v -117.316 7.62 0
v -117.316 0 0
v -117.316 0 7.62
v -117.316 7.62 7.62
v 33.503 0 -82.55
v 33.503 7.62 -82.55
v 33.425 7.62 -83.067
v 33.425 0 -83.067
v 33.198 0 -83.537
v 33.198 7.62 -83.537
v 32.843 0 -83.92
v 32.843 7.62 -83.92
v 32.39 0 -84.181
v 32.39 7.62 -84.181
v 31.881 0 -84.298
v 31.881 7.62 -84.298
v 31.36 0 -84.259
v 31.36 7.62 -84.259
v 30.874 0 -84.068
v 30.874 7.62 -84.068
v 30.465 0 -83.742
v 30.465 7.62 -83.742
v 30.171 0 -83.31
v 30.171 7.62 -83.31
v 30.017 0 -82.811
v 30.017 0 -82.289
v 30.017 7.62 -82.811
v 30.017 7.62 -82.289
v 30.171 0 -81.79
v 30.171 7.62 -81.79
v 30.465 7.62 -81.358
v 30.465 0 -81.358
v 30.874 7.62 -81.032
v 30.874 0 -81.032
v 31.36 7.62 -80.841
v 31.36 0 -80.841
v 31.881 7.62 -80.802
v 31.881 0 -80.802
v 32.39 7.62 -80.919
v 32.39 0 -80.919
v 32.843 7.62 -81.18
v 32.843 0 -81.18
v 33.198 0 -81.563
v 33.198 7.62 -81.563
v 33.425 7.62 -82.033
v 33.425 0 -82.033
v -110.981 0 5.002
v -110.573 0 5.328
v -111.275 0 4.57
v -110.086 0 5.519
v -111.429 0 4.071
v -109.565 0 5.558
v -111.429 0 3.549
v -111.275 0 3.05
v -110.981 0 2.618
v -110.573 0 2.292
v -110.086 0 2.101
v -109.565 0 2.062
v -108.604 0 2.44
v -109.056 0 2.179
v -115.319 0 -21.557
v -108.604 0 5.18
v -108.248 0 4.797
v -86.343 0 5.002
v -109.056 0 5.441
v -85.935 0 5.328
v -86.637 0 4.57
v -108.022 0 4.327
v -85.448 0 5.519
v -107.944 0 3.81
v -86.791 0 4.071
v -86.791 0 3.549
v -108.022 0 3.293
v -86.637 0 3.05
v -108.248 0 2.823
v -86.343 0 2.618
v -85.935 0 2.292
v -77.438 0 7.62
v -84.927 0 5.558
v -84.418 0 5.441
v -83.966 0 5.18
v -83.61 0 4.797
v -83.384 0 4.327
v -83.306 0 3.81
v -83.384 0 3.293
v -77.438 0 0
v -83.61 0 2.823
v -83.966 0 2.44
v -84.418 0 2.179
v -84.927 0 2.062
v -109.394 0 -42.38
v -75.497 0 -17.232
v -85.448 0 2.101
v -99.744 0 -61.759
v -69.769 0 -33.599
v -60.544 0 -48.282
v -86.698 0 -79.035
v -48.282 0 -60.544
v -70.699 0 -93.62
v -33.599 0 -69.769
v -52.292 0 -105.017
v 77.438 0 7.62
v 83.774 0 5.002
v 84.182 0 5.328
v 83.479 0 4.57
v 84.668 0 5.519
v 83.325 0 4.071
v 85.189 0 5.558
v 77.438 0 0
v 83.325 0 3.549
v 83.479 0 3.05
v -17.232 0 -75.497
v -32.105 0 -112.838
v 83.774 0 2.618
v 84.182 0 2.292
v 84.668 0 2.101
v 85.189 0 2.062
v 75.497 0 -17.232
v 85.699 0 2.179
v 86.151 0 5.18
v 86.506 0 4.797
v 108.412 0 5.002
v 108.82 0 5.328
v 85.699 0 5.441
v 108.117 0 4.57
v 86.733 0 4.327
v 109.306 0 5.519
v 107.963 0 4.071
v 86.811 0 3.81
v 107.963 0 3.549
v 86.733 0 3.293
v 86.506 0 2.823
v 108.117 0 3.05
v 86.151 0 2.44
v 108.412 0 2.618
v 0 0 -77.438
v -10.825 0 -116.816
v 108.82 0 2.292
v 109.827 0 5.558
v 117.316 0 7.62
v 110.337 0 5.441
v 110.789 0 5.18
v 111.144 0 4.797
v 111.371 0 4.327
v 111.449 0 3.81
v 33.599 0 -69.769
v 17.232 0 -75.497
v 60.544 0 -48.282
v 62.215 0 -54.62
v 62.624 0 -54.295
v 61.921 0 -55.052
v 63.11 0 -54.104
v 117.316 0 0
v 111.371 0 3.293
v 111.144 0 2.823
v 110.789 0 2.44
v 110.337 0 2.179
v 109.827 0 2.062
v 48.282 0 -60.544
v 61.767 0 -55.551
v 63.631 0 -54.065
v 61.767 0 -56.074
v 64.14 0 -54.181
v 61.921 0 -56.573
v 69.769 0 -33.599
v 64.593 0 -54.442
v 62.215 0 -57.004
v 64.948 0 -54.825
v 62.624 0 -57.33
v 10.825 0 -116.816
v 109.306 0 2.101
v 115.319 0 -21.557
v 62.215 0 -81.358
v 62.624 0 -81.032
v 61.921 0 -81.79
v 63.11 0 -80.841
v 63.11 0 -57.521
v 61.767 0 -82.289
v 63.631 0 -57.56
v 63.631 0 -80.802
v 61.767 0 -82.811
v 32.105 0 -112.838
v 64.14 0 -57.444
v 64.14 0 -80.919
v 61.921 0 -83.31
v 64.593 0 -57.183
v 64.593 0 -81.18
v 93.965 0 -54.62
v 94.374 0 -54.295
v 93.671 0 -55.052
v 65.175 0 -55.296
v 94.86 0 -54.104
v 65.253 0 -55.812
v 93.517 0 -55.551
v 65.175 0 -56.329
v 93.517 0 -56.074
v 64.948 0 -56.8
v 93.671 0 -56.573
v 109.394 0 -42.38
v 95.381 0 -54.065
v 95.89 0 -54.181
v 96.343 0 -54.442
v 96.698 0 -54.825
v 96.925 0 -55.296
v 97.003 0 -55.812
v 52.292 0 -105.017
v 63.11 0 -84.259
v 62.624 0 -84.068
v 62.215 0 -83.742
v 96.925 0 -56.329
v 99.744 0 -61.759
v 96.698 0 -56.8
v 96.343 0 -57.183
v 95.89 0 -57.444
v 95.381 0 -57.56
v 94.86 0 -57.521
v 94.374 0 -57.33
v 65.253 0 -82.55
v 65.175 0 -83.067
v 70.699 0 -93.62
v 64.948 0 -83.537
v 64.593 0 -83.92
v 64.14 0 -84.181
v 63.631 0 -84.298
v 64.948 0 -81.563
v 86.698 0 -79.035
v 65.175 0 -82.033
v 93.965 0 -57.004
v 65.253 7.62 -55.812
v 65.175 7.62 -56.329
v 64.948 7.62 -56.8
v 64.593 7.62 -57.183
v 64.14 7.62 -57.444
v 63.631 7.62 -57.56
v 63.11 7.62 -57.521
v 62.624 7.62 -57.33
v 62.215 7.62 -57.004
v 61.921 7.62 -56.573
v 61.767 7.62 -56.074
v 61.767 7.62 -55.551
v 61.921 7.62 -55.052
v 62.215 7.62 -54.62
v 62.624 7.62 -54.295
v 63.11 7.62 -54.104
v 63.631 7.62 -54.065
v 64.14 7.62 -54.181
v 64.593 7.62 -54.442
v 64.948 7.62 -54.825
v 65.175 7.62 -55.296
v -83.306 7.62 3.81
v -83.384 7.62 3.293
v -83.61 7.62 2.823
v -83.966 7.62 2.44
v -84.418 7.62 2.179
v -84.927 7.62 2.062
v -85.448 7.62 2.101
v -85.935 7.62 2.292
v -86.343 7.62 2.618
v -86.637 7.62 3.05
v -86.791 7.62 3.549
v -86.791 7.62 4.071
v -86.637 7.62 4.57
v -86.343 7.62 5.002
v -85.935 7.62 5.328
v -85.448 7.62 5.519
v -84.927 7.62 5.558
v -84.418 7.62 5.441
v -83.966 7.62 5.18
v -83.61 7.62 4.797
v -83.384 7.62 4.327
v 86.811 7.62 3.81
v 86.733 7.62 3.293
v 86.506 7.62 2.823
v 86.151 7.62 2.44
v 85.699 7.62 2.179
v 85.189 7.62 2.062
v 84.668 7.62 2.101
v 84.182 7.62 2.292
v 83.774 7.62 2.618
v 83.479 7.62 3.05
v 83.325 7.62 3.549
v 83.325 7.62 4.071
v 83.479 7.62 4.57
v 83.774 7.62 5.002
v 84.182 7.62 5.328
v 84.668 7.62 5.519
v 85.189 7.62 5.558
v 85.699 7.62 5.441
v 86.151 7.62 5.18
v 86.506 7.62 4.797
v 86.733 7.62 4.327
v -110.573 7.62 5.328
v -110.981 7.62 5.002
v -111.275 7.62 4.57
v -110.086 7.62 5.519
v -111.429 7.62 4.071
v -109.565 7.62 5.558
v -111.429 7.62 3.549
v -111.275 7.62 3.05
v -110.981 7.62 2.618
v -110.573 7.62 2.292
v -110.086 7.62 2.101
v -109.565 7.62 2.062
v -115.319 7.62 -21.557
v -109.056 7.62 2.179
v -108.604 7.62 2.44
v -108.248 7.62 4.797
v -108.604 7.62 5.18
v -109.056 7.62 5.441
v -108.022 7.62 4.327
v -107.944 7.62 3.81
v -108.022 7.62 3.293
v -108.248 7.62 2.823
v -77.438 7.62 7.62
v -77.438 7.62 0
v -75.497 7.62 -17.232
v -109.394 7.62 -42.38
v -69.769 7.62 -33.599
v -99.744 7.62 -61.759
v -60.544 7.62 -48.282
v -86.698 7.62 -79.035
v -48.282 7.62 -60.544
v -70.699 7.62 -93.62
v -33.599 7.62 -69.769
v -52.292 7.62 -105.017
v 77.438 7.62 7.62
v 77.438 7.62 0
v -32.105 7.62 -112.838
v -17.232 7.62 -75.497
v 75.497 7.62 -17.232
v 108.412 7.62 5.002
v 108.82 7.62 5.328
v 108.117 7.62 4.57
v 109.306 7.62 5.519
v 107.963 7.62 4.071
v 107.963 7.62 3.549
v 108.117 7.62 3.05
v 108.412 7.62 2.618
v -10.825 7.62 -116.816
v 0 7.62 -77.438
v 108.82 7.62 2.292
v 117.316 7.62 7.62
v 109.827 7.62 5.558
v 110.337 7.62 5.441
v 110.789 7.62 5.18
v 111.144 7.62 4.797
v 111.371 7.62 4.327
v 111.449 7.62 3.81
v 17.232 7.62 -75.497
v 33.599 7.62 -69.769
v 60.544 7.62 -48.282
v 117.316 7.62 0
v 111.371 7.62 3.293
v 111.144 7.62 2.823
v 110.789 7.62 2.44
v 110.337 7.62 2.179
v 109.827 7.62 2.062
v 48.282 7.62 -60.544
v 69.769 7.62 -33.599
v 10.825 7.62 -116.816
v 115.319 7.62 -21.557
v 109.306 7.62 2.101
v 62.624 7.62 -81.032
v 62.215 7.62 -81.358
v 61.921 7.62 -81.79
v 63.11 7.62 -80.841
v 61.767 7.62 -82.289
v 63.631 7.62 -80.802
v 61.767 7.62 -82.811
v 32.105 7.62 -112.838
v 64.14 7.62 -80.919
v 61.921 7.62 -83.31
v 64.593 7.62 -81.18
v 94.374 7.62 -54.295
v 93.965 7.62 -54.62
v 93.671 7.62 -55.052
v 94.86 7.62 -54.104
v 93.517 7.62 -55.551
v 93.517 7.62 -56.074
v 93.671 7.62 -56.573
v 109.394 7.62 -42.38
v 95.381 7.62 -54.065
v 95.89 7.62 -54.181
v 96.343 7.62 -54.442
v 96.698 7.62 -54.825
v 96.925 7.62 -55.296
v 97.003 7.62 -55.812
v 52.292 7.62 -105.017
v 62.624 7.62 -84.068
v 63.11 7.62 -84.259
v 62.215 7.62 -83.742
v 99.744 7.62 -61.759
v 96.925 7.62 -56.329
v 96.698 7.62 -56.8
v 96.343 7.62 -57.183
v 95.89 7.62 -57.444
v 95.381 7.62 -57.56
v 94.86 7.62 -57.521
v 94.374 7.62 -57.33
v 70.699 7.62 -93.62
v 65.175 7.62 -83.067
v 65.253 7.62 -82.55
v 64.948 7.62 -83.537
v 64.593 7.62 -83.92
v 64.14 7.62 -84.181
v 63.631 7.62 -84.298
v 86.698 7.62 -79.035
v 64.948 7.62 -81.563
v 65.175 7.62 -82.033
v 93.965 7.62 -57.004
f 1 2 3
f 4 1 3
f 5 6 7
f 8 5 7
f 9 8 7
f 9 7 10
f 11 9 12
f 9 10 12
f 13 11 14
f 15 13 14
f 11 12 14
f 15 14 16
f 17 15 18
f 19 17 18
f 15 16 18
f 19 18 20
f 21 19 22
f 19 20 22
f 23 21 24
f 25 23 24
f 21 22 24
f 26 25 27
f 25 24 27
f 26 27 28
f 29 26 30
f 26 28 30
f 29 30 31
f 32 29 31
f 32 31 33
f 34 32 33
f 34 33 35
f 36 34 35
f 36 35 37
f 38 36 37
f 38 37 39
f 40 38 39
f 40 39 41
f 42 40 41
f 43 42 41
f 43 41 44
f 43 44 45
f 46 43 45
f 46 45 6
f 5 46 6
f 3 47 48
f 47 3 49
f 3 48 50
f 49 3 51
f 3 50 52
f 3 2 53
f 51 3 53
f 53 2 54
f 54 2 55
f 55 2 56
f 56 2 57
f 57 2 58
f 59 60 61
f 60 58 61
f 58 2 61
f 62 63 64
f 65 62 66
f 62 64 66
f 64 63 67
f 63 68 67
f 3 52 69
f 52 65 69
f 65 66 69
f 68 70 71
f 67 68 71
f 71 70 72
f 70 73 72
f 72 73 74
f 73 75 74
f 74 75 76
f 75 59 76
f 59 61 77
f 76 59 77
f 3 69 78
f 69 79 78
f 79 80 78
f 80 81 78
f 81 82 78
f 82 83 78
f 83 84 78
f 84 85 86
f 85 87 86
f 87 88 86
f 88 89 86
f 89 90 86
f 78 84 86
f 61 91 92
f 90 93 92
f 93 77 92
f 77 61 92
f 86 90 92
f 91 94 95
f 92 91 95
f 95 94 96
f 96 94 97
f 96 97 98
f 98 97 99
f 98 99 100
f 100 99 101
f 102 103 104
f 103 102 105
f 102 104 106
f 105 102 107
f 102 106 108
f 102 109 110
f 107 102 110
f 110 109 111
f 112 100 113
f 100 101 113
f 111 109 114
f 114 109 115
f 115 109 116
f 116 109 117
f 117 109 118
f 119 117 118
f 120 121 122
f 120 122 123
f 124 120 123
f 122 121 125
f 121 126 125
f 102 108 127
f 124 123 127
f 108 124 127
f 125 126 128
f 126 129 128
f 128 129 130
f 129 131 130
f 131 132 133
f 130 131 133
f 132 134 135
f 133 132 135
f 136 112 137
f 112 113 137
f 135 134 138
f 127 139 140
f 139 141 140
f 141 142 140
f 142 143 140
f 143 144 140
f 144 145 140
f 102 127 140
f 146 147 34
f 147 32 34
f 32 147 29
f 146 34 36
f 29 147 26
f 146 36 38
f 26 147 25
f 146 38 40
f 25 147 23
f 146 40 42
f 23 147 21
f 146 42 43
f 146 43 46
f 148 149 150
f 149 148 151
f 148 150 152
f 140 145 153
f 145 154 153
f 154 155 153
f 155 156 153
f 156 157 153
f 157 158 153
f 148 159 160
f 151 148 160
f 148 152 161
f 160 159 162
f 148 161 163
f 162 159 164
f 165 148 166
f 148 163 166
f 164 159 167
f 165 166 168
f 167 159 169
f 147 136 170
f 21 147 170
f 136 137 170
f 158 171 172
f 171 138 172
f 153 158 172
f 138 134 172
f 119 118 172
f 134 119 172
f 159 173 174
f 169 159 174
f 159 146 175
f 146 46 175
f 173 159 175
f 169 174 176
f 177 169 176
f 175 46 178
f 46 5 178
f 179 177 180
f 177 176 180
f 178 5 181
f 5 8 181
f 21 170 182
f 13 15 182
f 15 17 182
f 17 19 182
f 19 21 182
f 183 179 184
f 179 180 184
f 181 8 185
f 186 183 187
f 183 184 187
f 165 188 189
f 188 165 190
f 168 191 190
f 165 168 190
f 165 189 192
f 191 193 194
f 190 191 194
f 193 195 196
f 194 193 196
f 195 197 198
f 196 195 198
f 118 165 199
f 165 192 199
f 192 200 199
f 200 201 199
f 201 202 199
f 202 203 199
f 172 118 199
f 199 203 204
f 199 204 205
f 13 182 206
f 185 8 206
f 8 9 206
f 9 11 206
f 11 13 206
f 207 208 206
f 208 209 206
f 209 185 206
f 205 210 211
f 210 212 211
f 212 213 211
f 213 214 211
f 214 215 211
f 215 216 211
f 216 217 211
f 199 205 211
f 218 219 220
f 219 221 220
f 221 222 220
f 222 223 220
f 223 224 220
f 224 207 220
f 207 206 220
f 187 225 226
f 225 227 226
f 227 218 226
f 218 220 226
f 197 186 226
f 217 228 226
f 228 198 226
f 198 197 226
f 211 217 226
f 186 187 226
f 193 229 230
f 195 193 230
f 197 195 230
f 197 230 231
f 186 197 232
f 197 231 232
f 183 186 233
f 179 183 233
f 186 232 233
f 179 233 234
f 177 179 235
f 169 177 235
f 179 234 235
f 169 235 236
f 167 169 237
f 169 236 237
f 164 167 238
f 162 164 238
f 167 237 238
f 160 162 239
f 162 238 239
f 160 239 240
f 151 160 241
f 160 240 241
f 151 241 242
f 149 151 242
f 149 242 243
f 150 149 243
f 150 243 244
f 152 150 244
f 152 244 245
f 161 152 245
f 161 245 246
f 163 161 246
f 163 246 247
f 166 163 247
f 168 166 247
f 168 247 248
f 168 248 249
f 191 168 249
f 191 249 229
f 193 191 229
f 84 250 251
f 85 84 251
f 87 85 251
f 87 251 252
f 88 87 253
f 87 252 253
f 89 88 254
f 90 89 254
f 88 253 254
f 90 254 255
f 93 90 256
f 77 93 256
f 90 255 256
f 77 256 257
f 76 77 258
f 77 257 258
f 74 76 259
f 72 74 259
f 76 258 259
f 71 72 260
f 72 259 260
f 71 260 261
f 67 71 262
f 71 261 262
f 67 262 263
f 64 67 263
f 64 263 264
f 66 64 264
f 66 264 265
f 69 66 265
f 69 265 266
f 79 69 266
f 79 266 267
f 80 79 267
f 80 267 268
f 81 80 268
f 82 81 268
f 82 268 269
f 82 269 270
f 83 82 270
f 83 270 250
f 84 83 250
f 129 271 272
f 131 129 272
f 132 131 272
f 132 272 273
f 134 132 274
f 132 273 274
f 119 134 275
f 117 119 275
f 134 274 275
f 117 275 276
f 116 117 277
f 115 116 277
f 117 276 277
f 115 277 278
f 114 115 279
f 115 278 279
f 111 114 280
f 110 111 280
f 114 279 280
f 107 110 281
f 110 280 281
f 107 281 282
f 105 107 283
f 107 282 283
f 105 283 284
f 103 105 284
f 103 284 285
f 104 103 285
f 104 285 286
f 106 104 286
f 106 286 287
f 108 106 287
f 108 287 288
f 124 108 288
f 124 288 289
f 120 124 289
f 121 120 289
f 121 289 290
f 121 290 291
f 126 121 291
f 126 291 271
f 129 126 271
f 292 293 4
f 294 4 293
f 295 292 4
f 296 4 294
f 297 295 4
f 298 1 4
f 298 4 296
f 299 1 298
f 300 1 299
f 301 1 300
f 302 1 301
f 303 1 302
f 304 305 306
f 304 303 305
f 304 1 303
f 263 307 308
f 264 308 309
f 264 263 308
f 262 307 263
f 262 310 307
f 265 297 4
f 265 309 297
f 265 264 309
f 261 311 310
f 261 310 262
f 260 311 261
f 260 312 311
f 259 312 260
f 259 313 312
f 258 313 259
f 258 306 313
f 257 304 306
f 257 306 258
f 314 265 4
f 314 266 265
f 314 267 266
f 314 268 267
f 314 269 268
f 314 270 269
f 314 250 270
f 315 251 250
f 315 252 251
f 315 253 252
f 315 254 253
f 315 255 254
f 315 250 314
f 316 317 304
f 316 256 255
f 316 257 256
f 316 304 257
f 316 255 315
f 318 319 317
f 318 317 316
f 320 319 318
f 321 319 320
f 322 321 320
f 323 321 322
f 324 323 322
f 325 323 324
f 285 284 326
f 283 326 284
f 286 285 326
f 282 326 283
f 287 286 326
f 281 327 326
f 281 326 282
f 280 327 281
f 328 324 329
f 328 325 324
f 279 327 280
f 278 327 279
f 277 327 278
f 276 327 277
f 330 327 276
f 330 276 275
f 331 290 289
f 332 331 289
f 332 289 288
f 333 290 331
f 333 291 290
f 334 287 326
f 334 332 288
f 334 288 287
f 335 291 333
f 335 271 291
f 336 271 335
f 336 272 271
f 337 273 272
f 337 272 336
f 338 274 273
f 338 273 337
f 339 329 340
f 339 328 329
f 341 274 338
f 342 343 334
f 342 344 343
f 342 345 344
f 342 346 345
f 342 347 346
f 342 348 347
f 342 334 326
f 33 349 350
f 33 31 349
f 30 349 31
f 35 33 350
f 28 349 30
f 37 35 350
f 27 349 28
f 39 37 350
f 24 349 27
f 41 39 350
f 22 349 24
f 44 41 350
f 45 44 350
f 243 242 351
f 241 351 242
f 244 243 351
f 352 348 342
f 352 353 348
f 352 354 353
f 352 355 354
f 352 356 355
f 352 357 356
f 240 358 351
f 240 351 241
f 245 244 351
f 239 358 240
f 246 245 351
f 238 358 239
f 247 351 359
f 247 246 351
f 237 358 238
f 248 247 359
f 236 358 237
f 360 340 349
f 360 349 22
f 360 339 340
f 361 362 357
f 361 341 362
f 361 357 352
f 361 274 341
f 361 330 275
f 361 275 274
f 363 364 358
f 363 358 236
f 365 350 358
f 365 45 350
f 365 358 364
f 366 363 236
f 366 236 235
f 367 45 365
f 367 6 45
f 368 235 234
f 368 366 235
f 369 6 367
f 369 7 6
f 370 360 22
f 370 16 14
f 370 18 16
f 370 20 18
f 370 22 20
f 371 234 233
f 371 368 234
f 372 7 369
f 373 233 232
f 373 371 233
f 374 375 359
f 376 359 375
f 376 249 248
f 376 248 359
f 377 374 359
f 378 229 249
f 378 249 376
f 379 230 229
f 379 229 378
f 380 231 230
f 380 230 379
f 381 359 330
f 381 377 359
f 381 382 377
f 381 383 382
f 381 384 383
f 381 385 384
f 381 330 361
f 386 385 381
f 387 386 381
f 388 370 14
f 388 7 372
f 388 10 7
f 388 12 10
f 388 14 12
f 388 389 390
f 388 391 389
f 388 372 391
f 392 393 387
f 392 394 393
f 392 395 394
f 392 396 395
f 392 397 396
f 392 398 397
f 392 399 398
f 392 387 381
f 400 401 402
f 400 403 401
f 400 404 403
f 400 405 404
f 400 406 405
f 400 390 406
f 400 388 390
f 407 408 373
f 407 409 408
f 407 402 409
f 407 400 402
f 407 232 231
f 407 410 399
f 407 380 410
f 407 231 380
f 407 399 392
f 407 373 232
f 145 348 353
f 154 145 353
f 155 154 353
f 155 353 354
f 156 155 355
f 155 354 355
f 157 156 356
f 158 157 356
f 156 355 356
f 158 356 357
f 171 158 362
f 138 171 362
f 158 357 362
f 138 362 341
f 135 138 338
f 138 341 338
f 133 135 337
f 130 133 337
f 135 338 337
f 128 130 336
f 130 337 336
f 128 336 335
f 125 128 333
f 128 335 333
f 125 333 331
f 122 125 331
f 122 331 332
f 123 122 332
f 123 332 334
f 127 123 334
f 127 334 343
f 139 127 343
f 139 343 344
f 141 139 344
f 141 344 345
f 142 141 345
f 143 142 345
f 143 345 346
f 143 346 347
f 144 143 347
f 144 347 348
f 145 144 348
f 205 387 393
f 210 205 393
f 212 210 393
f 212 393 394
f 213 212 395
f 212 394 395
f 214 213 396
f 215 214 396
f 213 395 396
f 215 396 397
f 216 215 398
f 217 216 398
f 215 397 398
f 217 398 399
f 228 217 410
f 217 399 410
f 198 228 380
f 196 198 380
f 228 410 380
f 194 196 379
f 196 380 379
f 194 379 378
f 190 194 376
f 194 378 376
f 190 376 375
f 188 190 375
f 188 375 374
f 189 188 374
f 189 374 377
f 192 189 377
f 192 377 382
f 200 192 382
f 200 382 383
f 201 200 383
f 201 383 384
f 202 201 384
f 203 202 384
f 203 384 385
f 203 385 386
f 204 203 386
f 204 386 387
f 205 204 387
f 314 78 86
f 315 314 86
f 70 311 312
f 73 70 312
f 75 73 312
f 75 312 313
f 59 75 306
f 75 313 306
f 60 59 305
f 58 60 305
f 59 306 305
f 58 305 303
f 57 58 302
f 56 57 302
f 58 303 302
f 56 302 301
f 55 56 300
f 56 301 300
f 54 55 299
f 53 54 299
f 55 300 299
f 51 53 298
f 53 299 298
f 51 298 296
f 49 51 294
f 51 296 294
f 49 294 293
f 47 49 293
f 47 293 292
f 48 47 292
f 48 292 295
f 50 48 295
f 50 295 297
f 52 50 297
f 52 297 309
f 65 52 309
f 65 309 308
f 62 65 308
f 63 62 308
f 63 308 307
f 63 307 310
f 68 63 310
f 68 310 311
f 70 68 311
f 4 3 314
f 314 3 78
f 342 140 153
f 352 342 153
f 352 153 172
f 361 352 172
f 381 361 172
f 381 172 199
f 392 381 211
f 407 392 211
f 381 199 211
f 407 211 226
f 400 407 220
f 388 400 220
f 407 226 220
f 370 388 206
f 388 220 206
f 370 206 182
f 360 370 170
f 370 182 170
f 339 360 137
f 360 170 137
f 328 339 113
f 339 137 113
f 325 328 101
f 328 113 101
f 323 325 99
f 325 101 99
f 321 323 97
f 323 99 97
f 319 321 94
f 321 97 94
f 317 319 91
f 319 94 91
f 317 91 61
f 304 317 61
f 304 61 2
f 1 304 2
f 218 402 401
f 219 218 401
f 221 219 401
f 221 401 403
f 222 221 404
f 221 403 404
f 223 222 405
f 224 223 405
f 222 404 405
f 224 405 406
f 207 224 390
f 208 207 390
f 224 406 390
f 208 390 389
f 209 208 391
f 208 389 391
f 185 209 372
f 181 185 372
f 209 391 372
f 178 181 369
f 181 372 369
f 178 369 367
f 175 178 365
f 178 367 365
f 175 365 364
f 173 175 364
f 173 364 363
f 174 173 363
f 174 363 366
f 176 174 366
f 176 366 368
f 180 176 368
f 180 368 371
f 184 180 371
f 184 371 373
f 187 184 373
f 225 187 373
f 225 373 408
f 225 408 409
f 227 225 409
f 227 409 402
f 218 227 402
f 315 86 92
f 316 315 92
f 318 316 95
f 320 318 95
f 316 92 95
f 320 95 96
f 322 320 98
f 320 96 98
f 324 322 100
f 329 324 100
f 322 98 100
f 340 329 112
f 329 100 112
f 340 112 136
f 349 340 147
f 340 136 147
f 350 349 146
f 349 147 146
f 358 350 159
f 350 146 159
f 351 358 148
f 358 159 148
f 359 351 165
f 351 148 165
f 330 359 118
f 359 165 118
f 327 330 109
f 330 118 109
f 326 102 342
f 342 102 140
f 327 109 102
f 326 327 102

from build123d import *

# Parameters (mm, degrees)
BOSS_EXTRUDE1_DEPTH = 7.62
CUT_EXTRUDE1_REACH  = 9.62
SKETCH3_R           = 1.7526


with BuildPart() as part:
    # Sketch1 → Boss-Extrude1 (new body)
    with BuildSketch(Plane(origin=(0, 0, 0), x_dir=(1, 0, 0), z_dir=(0, 1, 0))):
        with BuildLine():
            Line((-117.31625, 0), (-117.31625, -7.62))
            Line((-117.31625, -7.62), (-77.43825, -7.62))
            Line((-77.43825, -7.62), (-77.43825, 0))
            ThreePointArc((-77.43825, 0), (0, 77.43825), (77.43825, 0))
            Line((77.43825, 0), (77.43825, -7.62))
            Line((77.43825, -7.62), (117.31625, -7.62))
            Line((117.31625, -7.62), (117.31625, 0))
            ThreePointArc((117.31625, 0), (0, 117.31625), (-117.31625, 0))
        make_face()
    extrude(amount=BOSS_EXTRUDE1_DEPTH)

    # Sketch3 → Cut-Extrude1 (cut, up to next)
    with BuildSketch(Plane(origin=(0, 7.62, 0), x_dir=(1, 0, 0), z_dir=(0, 1, 0)), mode=Mode.PRIVATE) as cut_extrude1_sk1:
        with Locations((-109.69625, -3.81)):
            Circle(SKETCH3_R)
    cut_extrude1_tool1 = extrude(cut_extrude1_sk1.sketch, amount=-CUT_EXTRUDE1_REACH, mode=Mode.PRIVATE) & part.part
    add(cut_extrude1_tool1.solids().sort_by_distance((-109.69625, 7.62, 3.81))[0], mode=Mode.SUBTRACT)
    # Sketch3 → Cut-Extrude1 (cut, up to next)
    with BuildSketch(Plane(origin=(0, 7.62, 0), x_dir=(1, 0, 0), z_dir=(0, 1, 0)), mode=Mode.PRIVATE) as cut_extrude1_sk2:
        with Locations((-85.05825, -3.81)):
            Circle(SKETCH3_R)
    cut_extrude1_tool2 = extrude(cut_extrude1_sk2.sketch, amount=-CUT_EXTRUDE1_REACH, mode=Mode.PRIVATE) & part.part
    add(cut_extrude1_tool2.solids().sort_by_distance((-85.05825, 7.62, 3.81))[0], mode=Mode.SUBTRACT)
    # Sketch3 → Cut-Extrude1 (cut, up to next)
    with BuildSketch(Plane(origin=(0, 7.62, 0), x_dir=(1, 0, 0), z_dir=(0, 1, 0)), mode=Mode.PRIVATE) as cut_extrude1_sk3:
        with Locations((85.05825, -3.81)):
            Circle(SKETCH3_R)
    cut_extrude1_tool3 = extrude(cut_extrude1_sk3.sketch, amount=-CUT_EXTRUDE1_REACH, mode=Mode.PRIVATE) & part.part
    add(cut_extrude1_tool3.solids().sort_by_distance((85.05825, 7.62, 3.81))[0], mode=Mode.SUBTRACT)
    # Sketch3 → Cut-Extrude1 (cut, up to next)
    with BuildSketch(Plane(origin=(0, 7.62, 0), x_dir=(1, 0, 0), z_dir=(0, 1, 0)), mode=Mode.PRIVATE) as cut_extrude1_sk4:
        with Locations((109.69625, -3.81)):
            Circle(SKETCH3_R)
    cut_extrude1_tool4 = extrude(cut_extrude1_sk4.sketch, amount=-CUT_EXTRUDE1_REACH, mode=Mode.PRIVATE) & part.part
    add(cut_extrude1_tool4.solids().sort_by_distance((109.69625, 7.62, 3.81))[0], mode=Mode.SUBTRACT)
    # Sketch3 → Cut-Extrude1 (cut, up to next)
    with BuildSketch(Plane(origin=(0, 7.62, 0), x_dir=(1, 0, 0), z_dir=(0, 1, 0)), mode=Mode.PRIVATE) as cut_extrude1_sk5:
        with Locations((31.75, 82.55)):
            Circle(SKETCH3_R)
    cut_extrude1_tool5 = extrude(cut_extrude1_sk5.sketch, amount=-CUT_EXTRUDE1_REACH, mode=Mode.PRIVATE) & part.part
    add(cut_extrude1_tool5.solids().sort_by_distance((31.75, 7.62, -82.55))[0], mode=Mode.SUBTRACT)
    # Sketch3 → Cut-Extrude1 (cut, up to next)
    with BuildSketch(Plane(origin=(0, 7.62, 0), x_dir=(1, 0, 0), z_dir=(0, 1, 0)), mode=Mode.PRIVATE) as cut_extrude1_sk6:
        with Locations((63.5, 82.55)):
            Circle(SKETCH3_R)
    cut_extrude1_tool6 = extrude(cut_extrude1_sk6.sketch, amount=-CUT_EXTRUDE1_REACH, mode=Mode.PRIVATE) & part.part
    add(cut_extrude1_tool6.solids().sort_by_distance((63.5, 7.62, -82.55))[0], mode=Mode.SUBTRACT)
    # Sketch3 → Cut-Extrude1 (cut, up to next)
    with BuildSketch(Plane(origin=(0, 7.62, 0), x_dir=(1, 0, 0), z_dir=(0, 1, 0)), mode=Mode.PRIVATE) as cut_extrude1_sk7:
        with Locations((63.5, 55.812428263)):
            Circle(SKETCH3_R)
    cut_extrude1_tool7 = extrude(cut_extrude1_sk7.sketch, amount=-CUT_EXTRUDE1_REACH, mode=Mode.PRIVATE) & part.part
    add(cut_extrude1_tool7.solids().sort_by_distance((63.5, 7.62, -55.812428))[0], mode=Mode.SUBTRACT)
    # Sketch3 → Cut-Extrude1 (cut, up to next)
    with BuildSketch(Plane(origin=(0, 7.62, 0), x_dir=(1, 0, 0), z_dir=(0, 1, 0)), mode=Mode.PRIVATE) as cut_extrude1_sk8:
        with Locations((95.25, 55.812428263)):
            Circle(SKETCH3_R)
    cut_extrude1_tool8 = extrude(cut_extrude1_sk8.sketch, amount=-CUT_EXTRUDE1_REACH, mode=Mode.PRIVATE) & part.part
    add(cut_extrude1_tool8.solids().sort_by_distance((95.25, 7.62, -55.812428))[0], mode=Mode.SUBTRACT)


solid = part.part
